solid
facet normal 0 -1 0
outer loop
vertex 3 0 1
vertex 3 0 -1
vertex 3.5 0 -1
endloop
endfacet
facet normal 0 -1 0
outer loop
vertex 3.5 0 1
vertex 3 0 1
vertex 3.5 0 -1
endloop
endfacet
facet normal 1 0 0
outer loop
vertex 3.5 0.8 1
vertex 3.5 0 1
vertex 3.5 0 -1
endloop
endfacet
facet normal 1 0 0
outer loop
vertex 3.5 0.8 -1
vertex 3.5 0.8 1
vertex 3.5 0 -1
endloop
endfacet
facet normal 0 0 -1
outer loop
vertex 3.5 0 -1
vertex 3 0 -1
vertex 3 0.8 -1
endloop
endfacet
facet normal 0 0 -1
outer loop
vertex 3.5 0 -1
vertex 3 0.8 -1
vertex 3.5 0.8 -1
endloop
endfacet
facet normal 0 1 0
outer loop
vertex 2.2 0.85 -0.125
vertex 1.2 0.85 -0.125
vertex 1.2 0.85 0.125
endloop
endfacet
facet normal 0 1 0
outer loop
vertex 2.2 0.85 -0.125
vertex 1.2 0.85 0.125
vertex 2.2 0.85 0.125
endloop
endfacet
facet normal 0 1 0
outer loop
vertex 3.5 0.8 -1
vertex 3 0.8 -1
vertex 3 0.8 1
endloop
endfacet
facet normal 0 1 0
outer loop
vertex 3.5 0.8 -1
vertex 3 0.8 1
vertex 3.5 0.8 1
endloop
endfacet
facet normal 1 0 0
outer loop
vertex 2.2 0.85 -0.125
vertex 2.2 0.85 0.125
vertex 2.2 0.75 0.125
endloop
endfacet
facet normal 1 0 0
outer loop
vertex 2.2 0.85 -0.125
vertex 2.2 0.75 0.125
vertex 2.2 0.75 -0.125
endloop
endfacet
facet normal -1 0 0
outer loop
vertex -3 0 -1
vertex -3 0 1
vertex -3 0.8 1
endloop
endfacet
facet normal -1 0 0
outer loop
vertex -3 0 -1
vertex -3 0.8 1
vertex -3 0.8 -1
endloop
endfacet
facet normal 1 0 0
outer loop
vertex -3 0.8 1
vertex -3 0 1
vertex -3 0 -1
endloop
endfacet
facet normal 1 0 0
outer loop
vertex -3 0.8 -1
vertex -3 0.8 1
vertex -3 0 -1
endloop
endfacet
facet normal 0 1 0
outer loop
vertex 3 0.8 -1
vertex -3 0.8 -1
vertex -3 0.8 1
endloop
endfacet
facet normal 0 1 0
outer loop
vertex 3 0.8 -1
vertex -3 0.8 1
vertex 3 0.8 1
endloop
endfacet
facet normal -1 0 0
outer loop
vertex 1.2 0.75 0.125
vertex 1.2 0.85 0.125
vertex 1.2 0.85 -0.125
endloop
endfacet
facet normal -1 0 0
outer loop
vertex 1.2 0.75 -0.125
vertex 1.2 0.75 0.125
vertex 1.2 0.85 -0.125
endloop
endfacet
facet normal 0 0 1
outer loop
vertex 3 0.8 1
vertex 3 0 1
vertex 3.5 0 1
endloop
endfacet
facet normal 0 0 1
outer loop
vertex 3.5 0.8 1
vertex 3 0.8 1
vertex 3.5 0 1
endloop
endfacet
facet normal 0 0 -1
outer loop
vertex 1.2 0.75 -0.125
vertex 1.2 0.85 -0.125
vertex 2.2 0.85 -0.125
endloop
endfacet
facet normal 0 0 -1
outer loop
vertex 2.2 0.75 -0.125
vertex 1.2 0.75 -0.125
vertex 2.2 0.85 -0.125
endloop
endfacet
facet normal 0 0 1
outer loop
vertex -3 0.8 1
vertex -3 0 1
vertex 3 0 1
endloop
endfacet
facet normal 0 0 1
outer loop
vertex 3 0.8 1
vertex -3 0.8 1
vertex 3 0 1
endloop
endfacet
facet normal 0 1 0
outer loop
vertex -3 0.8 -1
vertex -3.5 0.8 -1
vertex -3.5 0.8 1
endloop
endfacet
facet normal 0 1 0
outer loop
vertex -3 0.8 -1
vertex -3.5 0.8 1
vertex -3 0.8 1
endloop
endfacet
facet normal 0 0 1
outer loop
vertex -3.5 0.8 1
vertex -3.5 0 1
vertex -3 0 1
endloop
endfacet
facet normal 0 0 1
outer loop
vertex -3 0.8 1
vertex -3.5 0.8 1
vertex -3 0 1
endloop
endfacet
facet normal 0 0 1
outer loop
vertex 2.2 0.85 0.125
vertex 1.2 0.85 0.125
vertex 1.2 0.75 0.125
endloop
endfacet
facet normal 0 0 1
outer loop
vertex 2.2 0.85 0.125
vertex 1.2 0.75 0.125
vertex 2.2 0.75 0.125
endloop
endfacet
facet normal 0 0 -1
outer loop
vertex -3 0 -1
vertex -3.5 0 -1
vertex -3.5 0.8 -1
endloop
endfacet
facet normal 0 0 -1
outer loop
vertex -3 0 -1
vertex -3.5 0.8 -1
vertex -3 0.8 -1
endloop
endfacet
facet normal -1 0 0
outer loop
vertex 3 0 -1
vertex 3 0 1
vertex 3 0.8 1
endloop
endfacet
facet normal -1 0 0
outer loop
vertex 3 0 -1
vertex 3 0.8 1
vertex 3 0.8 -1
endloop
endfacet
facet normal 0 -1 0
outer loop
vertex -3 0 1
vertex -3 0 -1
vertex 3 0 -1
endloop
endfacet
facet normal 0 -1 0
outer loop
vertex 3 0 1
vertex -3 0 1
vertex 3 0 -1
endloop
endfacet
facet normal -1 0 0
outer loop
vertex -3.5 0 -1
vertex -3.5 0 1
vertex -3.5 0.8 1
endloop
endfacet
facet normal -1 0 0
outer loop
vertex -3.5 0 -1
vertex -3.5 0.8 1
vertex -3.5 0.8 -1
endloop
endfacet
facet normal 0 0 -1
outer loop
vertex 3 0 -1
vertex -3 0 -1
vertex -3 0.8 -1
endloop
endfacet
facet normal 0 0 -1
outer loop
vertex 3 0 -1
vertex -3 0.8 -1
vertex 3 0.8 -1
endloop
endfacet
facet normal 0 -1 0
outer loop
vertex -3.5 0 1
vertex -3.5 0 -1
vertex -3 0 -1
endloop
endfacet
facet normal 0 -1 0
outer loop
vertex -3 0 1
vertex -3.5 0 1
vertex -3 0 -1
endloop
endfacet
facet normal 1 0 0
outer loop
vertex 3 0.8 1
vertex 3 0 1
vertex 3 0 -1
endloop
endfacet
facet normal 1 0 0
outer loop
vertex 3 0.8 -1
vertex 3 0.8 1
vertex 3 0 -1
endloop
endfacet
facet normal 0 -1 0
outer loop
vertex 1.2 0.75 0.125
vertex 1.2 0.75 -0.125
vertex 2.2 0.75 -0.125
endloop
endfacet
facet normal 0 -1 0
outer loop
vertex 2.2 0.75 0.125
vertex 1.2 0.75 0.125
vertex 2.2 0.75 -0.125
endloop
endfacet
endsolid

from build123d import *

# Parameters (mm, degrees)
SKETCH2_W             = 6
SKETCH2_H             = 2
BOSS_EXTRUDE1_DEPTH   = 0.8
SKETCH3_W             = 0.5
SKETCH3_H             = 2
BOSS_EXTRUDE2_DEPTH   = 0.8
BOSS_EXTRUDE2_2_DEPTH = 0.8
BOSS_EXTRUDE3_START   = 0.05
SKETCH4_W             = 1
SKETCH4_H             = 0.25
BOSS_EXTRUDE3_DEPTH   = 0.1


with BuildPart() as part:
    # Sketch2 → Boss-Extrude1 (new body)
    with BuildSketch(Plane(origin=(0, 0, 0), x_dir=(1, 0, 0), z_dir=(0, 1, 0))):
        Rectangle(SKETCH2_W, SKETCH2_H)
    extrude(amount=BOSS_EXTRUDE1_DEPTH)


with BuildPart() as body_2:
    # Sketch3 → Boss-Extrude2 (new body)
    with BuildSketch(Plane(origin=(0, 0, 0), x_dir=(1, 0, 0), z_dir=(0, 1, 0))):
        with Locations((-3.25, 0)):
            Rectangle(SKETCH3_W, SKETCH3_H)
    extrude(amount=BOSS_EXTRUDE2_DEPTH)


with BuildPart() as body_3:
    # Sketch3 → Boss-Extrude2 2 (new body)
    with BuildSketch(Plane(origin=(0, 0, 0), x_dir=(1, 0, 0), z_dir=(0, 1, 0))):
        with Locations((3.25, 0)):
            Rectangle(SKETCH3_W, SKETCH3_H)
    extrude(amount=BOSS_EXTRUDE2_2_DEPTH)


with BuildPart() as body_4:
    # Sketch4 → Boss-Extrude3 (new body)
    with BuildSketch(Plane(origin=(0, 0.8, 0), x_dir=(1, 0, 0), z_dir=(0, 1, 0)).offset(BOSS_EXTRUDE3_START)):
        with Locations((1.7, 0)):
            Rectangle(SKETCH4_W, SKETCH4_H)
    extrude(amount=-BOSS_EXTRUDE3_DEPTH)


solid = Compound([part.part, body_2.part, body_3.part, body_4.part])
